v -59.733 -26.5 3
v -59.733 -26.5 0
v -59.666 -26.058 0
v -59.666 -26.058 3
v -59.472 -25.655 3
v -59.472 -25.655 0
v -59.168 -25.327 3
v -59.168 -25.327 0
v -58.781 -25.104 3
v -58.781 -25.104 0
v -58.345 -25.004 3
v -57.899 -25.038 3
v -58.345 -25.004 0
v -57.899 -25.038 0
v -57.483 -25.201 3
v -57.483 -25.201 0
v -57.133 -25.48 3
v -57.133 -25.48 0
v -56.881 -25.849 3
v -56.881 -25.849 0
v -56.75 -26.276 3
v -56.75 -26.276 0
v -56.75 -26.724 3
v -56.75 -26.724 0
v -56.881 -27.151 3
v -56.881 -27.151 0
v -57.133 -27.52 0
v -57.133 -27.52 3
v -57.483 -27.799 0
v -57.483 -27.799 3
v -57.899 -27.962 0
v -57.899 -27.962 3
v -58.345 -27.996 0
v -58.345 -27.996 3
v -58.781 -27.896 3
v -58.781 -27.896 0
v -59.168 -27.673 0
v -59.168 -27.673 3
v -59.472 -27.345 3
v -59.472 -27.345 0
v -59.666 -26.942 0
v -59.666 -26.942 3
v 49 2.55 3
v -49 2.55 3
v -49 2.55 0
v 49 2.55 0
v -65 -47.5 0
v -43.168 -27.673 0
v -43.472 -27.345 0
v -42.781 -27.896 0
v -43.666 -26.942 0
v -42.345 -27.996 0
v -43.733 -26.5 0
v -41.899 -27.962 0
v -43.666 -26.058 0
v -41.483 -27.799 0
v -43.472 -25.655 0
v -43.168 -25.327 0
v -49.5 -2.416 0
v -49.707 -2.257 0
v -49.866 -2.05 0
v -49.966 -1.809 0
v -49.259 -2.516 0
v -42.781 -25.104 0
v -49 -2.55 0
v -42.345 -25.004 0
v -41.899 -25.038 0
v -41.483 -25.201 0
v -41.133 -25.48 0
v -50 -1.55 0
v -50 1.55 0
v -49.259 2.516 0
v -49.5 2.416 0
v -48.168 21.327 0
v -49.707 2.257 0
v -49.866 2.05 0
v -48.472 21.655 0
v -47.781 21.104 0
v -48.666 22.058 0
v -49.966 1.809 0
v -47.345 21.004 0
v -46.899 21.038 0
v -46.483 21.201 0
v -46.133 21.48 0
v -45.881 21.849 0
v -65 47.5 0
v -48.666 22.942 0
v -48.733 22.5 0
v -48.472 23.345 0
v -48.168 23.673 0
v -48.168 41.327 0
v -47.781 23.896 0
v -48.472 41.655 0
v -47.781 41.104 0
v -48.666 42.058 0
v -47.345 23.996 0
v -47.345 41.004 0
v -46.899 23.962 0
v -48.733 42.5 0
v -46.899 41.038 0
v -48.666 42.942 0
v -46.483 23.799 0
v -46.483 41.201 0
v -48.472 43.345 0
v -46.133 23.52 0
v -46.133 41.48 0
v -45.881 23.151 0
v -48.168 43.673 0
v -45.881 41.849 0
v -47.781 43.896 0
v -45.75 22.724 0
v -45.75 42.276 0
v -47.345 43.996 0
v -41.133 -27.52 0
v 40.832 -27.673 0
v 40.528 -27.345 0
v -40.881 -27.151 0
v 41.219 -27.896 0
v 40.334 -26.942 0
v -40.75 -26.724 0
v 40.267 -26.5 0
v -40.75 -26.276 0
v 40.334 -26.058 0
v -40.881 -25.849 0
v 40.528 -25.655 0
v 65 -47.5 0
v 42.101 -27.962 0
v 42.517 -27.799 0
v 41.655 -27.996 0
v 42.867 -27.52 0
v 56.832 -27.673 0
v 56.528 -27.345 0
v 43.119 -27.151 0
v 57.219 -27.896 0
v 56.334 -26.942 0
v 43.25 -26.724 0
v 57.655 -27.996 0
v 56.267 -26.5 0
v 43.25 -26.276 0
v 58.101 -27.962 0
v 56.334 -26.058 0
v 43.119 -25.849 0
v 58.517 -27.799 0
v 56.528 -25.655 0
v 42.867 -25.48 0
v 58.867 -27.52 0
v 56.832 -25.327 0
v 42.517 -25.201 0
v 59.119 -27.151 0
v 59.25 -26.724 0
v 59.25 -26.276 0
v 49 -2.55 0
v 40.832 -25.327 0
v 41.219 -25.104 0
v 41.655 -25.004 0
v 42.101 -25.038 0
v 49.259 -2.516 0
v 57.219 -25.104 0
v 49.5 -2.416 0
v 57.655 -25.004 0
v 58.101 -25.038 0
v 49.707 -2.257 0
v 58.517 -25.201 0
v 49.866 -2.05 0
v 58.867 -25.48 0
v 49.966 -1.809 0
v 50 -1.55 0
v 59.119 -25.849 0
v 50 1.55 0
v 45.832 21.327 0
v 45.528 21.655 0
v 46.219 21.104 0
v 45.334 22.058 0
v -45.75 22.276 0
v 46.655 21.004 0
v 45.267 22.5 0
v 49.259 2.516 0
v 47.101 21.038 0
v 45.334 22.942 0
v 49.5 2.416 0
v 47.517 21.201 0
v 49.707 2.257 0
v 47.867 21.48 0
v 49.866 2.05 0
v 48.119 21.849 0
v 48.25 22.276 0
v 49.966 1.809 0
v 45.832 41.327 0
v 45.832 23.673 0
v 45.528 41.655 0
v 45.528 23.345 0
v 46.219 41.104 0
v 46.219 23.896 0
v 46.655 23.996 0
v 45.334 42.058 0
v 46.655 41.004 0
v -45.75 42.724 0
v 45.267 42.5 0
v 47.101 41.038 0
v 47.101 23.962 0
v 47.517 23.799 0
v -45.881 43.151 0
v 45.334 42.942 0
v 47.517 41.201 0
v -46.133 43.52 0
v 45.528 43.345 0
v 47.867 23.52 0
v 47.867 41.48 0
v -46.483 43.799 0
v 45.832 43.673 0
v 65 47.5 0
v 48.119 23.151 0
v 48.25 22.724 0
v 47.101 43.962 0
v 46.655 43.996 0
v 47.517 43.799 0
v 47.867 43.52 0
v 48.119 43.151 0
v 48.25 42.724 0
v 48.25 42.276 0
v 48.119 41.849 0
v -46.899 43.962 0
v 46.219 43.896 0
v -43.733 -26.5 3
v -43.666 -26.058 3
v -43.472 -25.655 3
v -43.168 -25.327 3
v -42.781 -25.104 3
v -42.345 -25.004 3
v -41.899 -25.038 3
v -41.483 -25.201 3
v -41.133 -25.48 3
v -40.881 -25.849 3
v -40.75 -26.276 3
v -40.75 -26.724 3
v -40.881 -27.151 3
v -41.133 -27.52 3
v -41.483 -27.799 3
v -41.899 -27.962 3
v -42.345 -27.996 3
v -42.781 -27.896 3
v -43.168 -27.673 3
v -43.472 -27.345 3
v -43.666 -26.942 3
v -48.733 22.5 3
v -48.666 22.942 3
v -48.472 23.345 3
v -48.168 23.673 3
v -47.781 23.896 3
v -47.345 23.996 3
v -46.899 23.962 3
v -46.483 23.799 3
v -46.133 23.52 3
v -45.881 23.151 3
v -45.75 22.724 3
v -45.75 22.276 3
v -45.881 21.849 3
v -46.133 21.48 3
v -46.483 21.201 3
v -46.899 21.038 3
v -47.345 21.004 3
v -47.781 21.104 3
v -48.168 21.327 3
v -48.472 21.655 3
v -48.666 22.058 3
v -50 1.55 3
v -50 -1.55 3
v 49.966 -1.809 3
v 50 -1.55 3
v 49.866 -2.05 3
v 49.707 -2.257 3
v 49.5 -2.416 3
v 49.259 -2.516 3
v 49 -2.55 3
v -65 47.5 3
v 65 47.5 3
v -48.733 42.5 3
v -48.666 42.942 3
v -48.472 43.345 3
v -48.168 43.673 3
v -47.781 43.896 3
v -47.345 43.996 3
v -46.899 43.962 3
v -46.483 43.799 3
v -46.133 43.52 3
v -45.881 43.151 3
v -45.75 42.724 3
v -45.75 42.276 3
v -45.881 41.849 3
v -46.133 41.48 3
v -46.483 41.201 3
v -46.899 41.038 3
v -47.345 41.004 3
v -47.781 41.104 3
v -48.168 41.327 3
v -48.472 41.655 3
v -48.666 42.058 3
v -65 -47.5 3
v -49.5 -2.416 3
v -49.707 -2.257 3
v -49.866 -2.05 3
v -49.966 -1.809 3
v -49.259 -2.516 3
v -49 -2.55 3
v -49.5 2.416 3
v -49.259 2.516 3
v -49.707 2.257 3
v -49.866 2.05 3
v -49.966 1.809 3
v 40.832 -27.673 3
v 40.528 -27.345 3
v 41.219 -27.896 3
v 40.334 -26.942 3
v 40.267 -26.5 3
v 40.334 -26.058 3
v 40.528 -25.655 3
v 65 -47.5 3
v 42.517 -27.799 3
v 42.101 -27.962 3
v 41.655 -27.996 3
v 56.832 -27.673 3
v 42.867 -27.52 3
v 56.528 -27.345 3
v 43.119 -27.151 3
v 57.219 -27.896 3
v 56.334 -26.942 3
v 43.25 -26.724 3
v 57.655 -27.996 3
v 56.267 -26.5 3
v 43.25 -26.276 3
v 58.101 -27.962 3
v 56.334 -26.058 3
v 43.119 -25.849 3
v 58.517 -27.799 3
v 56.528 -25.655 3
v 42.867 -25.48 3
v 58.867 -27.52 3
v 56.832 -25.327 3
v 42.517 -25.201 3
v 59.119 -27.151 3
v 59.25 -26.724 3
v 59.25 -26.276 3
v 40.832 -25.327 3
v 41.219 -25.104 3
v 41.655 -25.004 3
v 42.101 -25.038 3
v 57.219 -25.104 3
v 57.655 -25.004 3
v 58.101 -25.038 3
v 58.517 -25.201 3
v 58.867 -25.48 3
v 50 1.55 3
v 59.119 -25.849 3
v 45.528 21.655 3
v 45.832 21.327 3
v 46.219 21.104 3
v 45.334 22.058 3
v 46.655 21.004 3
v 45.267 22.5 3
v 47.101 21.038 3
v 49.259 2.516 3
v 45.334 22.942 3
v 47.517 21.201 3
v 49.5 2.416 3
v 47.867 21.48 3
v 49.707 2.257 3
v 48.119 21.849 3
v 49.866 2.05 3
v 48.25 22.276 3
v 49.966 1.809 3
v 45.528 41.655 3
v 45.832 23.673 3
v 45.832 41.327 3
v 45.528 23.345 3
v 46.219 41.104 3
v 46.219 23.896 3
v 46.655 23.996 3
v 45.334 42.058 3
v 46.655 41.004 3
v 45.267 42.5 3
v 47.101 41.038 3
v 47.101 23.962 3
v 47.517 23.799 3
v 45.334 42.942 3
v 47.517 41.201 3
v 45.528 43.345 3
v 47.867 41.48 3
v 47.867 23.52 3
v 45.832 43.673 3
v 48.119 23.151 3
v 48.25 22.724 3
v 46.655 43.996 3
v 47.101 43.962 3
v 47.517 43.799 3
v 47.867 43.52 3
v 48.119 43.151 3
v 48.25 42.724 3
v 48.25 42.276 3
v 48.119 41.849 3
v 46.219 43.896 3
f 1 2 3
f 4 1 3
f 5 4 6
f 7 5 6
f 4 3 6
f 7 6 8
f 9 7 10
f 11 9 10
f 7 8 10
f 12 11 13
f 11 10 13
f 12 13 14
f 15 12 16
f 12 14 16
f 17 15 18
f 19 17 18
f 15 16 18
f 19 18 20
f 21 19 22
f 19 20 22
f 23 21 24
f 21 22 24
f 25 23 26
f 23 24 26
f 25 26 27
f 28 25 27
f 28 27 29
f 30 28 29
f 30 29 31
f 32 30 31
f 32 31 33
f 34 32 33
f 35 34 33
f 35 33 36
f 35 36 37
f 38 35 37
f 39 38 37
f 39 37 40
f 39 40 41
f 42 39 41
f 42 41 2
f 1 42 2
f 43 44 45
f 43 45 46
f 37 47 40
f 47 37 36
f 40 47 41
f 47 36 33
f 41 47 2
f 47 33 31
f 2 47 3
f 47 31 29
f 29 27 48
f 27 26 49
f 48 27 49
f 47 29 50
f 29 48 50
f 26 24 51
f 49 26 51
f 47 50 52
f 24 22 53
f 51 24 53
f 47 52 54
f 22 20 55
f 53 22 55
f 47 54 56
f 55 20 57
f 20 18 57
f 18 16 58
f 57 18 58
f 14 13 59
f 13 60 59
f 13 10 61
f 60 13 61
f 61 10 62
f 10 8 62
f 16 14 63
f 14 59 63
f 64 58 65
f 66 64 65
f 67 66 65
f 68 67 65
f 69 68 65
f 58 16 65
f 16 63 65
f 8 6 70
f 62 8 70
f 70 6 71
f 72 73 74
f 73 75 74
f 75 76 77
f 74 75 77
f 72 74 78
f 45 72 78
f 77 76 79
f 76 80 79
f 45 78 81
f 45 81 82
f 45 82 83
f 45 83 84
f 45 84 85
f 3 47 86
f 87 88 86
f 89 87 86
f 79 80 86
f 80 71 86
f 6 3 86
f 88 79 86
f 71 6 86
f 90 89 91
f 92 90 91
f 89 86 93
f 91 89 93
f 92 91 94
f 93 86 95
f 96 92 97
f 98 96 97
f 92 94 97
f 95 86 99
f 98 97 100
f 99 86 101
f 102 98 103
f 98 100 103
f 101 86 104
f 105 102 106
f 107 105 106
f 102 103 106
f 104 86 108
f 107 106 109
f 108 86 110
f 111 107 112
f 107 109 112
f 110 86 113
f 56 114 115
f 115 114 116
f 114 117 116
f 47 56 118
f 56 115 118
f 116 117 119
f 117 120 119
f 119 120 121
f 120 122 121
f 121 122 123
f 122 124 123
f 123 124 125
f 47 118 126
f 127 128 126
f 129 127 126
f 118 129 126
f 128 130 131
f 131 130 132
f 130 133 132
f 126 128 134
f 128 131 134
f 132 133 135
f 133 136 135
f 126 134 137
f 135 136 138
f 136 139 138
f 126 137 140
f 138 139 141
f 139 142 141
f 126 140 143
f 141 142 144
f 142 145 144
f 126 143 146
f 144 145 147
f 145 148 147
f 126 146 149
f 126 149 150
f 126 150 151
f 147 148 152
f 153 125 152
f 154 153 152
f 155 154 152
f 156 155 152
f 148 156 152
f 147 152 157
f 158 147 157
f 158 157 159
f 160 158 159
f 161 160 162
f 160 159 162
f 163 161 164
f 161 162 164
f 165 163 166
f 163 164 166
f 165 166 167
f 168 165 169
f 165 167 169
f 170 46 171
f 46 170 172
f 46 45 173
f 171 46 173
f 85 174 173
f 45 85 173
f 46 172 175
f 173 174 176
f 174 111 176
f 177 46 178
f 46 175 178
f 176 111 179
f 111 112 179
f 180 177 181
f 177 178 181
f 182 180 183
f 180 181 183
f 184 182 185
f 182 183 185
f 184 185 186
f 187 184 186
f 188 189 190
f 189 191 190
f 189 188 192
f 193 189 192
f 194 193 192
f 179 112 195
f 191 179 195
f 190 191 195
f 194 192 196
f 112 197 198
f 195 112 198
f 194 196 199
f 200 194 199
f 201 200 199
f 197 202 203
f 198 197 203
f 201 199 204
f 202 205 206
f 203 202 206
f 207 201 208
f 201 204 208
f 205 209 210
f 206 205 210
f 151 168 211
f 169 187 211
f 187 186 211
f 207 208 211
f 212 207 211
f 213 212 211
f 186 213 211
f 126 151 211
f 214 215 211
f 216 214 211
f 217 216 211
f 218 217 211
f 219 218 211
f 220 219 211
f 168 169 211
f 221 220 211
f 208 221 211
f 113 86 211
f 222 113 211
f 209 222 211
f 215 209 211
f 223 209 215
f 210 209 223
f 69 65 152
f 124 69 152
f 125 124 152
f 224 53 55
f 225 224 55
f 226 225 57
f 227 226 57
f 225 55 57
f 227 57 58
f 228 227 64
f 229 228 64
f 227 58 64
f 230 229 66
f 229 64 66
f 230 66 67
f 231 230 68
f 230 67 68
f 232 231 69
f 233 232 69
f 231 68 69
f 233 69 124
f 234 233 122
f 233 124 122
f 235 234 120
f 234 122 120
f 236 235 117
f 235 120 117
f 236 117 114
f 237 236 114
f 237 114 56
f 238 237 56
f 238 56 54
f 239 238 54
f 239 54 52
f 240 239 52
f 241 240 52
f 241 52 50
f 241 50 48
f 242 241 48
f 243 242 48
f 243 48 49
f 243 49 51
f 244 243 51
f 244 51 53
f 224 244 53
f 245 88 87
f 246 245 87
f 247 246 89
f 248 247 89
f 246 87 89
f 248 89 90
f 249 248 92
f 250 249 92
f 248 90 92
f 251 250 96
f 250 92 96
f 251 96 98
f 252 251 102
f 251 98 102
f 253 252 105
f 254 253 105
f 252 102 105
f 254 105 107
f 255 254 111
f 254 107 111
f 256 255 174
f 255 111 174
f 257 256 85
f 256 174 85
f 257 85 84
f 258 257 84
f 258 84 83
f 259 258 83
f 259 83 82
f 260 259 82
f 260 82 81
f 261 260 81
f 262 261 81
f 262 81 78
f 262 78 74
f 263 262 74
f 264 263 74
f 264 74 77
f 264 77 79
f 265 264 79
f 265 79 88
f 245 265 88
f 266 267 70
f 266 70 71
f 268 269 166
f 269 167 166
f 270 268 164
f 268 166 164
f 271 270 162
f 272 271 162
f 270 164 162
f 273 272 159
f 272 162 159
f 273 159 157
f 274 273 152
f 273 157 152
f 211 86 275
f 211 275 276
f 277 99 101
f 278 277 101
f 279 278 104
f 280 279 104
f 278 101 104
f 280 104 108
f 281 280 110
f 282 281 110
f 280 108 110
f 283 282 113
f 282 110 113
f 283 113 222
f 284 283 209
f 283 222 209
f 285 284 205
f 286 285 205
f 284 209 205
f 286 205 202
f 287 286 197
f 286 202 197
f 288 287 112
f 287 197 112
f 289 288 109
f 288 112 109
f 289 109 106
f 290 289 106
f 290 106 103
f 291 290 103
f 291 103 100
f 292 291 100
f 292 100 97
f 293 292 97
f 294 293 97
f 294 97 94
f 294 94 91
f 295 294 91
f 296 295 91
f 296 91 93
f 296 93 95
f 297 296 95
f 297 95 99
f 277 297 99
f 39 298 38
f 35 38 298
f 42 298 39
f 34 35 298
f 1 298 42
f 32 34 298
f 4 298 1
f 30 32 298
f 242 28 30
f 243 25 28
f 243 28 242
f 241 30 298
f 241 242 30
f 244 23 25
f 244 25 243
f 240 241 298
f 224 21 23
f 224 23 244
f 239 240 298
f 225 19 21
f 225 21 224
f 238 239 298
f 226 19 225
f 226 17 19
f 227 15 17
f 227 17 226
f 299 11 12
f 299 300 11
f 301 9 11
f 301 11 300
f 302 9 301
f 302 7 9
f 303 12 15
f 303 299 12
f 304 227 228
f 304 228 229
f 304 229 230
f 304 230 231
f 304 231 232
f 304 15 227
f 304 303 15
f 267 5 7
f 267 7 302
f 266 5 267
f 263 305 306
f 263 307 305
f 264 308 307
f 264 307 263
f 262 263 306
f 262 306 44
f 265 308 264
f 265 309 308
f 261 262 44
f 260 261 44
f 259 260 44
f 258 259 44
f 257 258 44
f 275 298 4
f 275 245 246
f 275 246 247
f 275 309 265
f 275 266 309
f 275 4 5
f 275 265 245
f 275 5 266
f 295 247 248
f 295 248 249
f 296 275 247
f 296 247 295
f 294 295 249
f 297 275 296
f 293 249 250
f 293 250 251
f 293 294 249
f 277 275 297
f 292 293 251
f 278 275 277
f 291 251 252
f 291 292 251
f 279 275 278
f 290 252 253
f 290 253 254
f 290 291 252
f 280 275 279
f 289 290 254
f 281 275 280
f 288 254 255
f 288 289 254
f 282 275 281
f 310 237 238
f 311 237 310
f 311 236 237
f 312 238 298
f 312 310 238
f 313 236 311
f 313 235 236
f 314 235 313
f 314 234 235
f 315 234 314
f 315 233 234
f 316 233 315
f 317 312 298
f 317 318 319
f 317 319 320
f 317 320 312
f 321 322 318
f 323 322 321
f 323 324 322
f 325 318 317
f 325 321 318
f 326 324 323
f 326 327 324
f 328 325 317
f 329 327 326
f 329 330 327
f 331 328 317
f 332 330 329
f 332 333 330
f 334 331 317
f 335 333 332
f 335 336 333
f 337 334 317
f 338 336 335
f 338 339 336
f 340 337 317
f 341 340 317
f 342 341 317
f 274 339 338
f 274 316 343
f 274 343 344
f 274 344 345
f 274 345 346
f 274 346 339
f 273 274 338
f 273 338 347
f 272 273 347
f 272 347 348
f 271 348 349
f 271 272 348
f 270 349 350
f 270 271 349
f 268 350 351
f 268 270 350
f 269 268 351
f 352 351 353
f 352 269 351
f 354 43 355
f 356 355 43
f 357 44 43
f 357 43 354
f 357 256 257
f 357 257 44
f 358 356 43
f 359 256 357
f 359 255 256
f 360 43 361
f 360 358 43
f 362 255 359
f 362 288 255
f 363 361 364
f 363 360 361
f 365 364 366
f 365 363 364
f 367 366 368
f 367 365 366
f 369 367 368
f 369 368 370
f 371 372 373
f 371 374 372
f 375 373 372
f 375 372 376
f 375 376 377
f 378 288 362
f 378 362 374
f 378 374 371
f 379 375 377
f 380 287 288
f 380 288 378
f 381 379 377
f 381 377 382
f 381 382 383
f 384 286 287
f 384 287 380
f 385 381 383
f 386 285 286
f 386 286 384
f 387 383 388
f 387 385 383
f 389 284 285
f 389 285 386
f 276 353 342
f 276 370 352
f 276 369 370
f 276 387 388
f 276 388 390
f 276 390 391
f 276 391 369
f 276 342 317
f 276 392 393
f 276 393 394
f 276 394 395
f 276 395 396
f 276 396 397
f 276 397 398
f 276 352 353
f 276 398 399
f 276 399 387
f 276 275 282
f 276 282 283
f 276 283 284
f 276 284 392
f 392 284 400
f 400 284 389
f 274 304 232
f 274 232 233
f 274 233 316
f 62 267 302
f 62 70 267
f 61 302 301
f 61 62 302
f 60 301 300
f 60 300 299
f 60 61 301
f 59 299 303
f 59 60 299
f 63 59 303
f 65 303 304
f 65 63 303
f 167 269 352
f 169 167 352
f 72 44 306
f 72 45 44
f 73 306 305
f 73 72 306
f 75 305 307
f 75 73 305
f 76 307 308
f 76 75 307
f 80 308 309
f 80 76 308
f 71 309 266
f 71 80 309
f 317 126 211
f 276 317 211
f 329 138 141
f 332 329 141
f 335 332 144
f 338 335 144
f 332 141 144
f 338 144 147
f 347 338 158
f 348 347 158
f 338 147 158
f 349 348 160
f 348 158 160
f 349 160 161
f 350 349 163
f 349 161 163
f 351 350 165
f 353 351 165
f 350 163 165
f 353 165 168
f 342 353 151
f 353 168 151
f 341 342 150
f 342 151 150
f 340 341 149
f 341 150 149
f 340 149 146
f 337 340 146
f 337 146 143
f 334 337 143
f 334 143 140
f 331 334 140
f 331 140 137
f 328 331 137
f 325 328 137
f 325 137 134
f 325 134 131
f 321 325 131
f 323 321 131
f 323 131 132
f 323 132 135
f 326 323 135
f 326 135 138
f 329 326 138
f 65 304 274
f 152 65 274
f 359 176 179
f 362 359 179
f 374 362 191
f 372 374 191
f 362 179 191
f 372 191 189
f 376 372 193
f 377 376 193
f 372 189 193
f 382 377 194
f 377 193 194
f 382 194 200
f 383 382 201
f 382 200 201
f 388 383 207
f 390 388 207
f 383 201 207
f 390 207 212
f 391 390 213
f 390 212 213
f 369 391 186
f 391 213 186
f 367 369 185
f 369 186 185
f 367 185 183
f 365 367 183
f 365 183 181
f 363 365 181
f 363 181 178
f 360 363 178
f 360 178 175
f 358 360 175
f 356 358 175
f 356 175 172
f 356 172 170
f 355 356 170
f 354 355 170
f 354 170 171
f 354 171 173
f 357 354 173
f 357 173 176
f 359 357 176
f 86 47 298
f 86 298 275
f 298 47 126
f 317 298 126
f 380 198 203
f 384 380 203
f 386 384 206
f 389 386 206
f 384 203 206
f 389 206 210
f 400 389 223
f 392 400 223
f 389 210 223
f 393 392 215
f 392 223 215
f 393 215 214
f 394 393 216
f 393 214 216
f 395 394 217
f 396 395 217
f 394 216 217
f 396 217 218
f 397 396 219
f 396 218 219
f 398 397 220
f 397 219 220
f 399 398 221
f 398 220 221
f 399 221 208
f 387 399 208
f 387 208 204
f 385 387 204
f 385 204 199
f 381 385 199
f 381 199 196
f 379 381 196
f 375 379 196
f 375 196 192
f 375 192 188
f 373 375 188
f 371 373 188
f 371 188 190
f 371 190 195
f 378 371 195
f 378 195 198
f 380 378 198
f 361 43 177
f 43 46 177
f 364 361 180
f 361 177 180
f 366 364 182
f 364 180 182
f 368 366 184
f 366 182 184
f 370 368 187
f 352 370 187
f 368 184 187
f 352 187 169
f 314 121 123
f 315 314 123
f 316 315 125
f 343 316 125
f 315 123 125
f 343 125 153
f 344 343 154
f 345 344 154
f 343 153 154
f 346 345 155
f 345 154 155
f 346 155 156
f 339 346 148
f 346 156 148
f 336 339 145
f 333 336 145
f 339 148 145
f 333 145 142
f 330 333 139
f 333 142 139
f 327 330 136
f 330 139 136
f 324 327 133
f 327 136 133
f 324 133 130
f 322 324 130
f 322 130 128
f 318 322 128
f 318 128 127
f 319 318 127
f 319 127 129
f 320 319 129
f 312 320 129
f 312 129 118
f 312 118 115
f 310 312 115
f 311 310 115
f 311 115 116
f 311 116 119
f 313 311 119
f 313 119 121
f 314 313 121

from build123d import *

# Parameters (mm, degrees)
SKETCH_1_W          = 130
SKETCH_1_H          = 95
EXTRUDE_1_DEPTH     = 3
SKETCH_3_R          = 1.5
CUT_EXTRUDE_2_DEPTH = 10
SKETCH_4_R          = 1.5
CUT_EXTRUDE_3_DEPTH = 10
SKETCH_5_W          = 100
SKETCH_5_H          = 5.1
CUT_EXTRUDE_4_DEPTH = 10
FILLET_1_R          = 1
FILLET_2_R          = 1


with BuildPart() as part:
    # 草图1 → 凸台-拉伸1 (new body)
    with BuildSketch(Plane.XY):
        Rectangle(SKETCH_1_W, SKETCH_1_H)
    extrude(amount=EXTRUDE_1_DEPTH)

    # 草图3 → 切除-拉伸2 (cut)
    with BuildSketch(Plane(origin=(0, 0, 0), x_dir=(-1, 0, 0), z_dir=(0, 0, -1))):
        with Locations((-57.767112616, -26.5)):
            Circle(SKETCH_3_R)
        with Locations((-41.767112616, -26.5)):
            Circle(SKETCH_3_R)
        with Locations((42.232887384, -26.5)):
            Circle(SKETCH_3_R)
        with Locations((58.232887384, -26.5)):
            Circle(SKETCH_3_R)
    extrude(amount=-CUT_EXTRUDE_2_DEPTH, mode=Mode.SUBTRACT)

    # 草图4 → 切除-拉伸3 (cut)
    with BuildSketch(Plane(origin=(0, 0, 0), x_dir=(-1, 0, 0), z_dir=(0, 0, -1))):
        with Locations((-46.767112616, 42.5)):
            Circle(SKETCH_4_R)
        with Locations((-46.767112616, 22.5)):
            Circle(SKETCH_4_R)
        with Locations((47.232887384, 42.5)):
            Circle(SKETCH_4_R)
        with Locations((47.232887384, 22.5)):
            Circle(SKETCH_4_R)
    extrude(amount=-CUT_EXTRUDE_3_DEPTH, mode=Mode.SUBTRACT)

    # 草图5 → 切除-拉伸4 (cut)
    with BuildSketch(Plane.XY.offset(3)):
        Rectangle(SKETCH_5_W, SKETCH_5_H)
    extrude(amount=-CUT_EXTRUDE_4_DEPTH, mode=Mode.SUBTRACT)

    # 圆角1
    fillet_1_edges = [part.edges().sort_by_distance(p)[0] for p in [
        (-50, 2.55, 1.5),
    ]]
    fillet(fillet_1_edges, radius=FILLET_1_R)

    # 圆角2
    fillet_2_edges = [part.edges().sort_by_distance(p)[0] for p in [
        (-50, -2.55, 1.5),
        (50, 2.55, 1.5),
        (50, -2.55, 1.5),
    ]]
    fillet(fillet_2_edges, radius=FILLET_2_R)


solid = part.part
